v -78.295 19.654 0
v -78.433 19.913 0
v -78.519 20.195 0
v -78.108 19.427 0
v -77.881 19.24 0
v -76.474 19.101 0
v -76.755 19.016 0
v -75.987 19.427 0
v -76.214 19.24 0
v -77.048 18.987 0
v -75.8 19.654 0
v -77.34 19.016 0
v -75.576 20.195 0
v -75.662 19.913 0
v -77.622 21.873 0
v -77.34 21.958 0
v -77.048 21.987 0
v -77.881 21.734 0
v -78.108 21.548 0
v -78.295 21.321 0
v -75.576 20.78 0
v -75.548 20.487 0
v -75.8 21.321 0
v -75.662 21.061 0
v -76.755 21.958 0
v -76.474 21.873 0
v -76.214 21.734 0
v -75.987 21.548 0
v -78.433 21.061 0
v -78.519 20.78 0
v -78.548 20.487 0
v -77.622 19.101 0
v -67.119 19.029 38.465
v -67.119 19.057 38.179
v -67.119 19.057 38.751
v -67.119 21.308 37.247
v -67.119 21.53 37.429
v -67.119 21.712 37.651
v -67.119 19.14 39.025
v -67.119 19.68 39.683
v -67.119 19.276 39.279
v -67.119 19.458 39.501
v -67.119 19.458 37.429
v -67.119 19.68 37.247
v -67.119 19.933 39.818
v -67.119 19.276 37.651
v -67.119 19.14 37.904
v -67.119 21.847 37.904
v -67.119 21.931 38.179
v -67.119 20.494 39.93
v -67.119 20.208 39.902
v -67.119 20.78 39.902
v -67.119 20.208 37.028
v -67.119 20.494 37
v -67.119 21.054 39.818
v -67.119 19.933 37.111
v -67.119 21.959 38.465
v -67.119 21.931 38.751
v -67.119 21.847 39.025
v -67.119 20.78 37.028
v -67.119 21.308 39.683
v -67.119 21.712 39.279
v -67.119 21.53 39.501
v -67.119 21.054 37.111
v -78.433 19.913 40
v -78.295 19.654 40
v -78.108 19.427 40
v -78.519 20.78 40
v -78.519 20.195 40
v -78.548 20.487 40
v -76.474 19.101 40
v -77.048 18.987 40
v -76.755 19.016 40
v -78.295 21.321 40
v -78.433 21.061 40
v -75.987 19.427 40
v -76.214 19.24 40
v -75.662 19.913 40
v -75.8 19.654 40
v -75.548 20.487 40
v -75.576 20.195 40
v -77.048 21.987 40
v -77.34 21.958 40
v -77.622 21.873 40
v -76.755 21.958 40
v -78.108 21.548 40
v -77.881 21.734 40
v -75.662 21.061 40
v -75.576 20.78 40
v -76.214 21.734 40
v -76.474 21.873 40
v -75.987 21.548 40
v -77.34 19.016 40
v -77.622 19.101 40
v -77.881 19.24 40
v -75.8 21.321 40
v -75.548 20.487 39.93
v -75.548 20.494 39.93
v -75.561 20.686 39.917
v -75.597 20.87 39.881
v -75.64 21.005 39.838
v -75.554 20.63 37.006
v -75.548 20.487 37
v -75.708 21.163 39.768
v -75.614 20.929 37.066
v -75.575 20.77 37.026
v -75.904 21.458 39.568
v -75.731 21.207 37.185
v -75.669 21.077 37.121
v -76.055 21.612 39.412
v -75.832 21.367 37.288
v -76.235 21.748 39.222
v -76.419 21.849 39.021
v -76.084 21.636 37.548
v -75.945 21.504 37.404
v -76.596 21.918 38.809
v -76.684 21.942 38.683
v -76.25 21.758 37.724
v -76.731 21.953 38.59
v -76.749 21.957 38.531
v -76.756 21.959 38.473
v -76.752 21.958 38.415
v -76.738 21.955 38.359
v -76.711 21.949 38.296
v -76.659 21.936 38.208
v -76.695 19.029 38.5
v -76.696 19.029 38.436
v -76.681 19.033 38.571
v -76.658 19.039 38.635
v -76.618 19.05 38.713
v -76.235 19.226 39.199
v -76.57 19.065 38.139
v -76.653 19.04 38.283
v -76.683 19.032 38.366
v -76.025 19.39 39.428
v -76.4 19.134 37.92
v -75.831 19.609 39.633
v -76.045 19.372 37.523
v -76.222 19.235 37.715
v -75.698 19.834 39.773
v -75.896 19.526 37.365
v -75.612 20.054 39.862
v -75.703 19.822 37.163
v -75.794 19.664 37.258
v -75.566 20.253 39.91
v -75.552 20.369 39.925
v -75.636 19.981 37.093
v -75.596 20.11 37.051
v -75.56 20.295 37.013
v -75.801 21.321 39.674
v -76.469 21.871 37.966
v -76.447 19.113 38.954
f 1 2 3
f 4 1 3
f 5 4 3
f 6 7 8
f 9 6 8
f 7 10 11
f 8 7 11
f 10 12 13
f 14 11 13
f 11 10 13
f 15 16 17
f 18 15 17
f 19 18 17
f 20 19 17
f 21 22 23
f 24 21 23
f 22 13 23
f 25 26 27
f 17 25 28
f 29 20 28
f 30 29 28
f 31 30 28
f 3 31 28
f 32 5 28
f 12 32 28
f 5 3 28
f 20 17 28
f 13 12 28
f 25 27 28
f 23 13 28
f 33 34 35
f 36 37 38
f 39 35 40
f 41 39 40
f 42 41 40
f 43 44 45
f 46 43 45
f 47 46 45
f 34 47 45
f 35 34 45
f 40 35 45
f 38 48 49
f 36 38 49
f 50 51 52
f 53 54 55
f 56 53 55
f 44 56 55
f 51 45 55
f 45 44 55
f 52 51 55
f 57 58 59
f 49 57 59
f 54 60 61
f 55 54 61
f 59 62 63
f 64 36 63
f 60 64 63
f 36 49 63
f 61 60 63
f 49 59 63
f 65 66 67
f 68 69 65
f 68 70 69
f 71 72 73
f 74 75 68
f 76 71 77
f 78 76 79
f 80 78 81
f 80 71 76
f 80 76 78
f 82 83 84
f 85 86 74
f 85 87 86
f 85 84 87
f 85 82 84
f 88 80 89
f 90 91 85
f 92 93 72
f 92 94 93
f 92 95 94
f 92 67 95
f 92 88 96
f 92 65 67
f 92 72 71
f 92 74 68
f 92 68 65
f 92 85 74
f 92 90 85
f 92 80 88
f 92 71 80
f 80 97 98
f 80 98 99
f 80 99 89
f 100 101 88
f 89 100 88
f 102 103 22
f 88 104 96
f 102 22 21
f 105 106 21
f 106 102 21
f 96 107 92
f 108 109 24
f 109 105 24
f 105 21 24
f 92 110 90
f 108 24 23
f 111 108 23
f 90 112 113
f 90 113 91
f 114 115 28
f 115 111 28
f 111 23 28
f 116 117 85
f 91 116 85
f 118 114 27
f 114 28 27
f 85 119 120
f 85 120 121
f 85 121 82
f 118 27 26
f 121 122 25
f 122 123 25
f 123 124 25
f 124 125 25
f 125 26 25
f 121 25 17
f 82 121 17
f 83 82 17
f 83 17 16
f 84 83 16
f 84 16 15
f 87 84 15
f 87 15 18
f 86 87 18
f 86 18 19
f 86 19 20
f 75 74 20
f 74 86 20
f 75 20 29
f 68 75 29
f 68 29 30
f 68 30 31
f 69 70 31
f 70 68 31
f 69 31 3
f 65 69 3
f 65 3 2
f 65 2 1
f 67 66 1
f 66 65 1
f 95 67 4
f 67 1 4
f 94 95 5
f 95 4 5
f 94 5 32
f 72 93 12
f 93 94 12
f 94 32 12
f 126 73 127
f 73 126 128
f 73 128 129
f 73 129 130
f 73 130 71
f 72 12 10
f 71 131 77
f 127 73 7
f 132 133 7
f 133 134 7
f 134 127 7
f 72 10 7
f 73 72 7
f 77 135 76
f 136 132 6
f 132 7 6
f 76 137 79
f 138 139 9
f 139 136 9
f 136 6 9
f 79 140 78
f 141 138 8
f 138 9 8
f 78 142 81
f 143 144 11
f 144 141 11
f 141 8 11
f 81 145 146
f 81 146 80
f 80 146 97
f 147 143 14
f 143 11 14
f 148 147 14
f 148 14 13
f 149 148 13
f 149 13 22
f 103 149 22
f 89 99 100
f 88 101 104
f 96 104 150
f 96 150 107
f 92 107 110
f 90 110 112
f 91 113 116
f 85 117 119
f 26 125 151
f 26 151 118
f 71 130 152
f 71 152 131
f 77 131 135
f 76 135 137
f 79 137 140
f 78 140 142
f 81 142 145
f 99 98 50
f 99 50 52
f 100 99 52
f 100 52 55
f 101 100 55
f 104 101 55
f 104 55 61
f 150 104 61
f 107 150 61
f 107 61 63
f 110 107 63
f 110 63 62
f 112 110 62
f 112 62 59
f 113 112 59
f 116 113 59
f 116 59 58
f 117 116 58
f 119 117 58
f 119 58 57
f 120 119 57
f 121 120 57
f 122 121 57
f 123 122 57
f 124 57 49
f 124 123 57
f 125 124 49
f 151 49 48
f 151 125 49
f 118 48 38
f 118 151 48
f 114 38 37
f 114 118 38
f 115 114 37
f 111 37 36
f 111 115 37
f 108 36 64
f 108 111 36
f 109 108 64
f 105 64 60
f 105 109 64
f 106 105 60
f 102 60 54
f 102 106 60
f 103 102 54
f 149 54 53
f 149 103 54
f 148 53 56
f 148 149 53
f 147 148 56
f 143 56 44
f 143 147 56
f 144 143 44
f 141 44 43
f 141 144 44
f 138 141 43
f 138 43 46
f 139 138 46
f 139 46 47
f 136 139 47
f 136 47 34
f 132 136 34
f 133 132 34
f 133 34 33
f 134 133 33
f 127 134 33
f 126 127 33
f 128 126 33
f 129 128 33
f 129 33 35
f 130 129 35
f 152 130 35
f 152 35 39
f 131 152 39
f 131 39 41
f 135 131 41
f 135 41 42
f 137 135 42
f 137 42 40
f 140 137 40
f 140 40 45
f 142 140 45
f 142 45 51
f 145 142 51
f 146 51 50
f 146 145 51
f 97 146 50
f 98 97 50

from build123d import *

# Parameters (mm, degrees)
SKETCH3_R           = 1.5
BOSS_EXTRUDE1_DEPTH = 40
SKETCH4_W           = 10
SKETCH4_H           = 1.987336218
EXTRUDE_THIN1_DEPTH = 10
SKETCH7_R           = 1.464965711
BOSS_EXTRUDE4_DEPTH = 10
SKETCH9_W           = 11.25222939
SKETCH9_H           = 3.128852859
CUT_EXTRUDE1_DEPTH  = 57.344455031


with BuildPart() as part:
    # Sketch3 → Boss-Extrude1 (new body)
    with BuildSketch(Plane.XY):
        with Locations((-77.047665821, 20.487229207)):
            Circle(SKETCH3_R)
    extrude(amount=BOSS_EXTRUDE1_DEPTH)

    # Sketch4 → Extrude-Thin1 (add)
    with BuildSketch(Plane.XY.offset(40)):
        with Locations((-72.119350757, 22.979183427)):
            Rectangle(SKETCH4_W, SKETCH4_H)
    extrude(amount=EXTRUDE_THIN1_DEPTH)

    # Sketch7 → Boss-Extrude4 (add)
    with BuildSketch(Plane.ZY.offset(77.119350757)):
        with Locations((38.46487538, 20.493738907)):
            Circle(SKETCH7_R)
    extrude(amount=-BOSS_EXTRUDE4_DEPTH)

    # Sketch9 → Cut-Extrude1 (cut, through all)
    with BuildSketch(Plane.ZY.offset(77.119350757)):
        with Locations((45.626114695, 22.408425107)):
            Rectangle(SKETCH9_W, SKETCH9_H)
    extrude(amount=-CUT_EXTRUDE1_DEPTH, mode=Mode.SUBTRACT)


solid = part.part
